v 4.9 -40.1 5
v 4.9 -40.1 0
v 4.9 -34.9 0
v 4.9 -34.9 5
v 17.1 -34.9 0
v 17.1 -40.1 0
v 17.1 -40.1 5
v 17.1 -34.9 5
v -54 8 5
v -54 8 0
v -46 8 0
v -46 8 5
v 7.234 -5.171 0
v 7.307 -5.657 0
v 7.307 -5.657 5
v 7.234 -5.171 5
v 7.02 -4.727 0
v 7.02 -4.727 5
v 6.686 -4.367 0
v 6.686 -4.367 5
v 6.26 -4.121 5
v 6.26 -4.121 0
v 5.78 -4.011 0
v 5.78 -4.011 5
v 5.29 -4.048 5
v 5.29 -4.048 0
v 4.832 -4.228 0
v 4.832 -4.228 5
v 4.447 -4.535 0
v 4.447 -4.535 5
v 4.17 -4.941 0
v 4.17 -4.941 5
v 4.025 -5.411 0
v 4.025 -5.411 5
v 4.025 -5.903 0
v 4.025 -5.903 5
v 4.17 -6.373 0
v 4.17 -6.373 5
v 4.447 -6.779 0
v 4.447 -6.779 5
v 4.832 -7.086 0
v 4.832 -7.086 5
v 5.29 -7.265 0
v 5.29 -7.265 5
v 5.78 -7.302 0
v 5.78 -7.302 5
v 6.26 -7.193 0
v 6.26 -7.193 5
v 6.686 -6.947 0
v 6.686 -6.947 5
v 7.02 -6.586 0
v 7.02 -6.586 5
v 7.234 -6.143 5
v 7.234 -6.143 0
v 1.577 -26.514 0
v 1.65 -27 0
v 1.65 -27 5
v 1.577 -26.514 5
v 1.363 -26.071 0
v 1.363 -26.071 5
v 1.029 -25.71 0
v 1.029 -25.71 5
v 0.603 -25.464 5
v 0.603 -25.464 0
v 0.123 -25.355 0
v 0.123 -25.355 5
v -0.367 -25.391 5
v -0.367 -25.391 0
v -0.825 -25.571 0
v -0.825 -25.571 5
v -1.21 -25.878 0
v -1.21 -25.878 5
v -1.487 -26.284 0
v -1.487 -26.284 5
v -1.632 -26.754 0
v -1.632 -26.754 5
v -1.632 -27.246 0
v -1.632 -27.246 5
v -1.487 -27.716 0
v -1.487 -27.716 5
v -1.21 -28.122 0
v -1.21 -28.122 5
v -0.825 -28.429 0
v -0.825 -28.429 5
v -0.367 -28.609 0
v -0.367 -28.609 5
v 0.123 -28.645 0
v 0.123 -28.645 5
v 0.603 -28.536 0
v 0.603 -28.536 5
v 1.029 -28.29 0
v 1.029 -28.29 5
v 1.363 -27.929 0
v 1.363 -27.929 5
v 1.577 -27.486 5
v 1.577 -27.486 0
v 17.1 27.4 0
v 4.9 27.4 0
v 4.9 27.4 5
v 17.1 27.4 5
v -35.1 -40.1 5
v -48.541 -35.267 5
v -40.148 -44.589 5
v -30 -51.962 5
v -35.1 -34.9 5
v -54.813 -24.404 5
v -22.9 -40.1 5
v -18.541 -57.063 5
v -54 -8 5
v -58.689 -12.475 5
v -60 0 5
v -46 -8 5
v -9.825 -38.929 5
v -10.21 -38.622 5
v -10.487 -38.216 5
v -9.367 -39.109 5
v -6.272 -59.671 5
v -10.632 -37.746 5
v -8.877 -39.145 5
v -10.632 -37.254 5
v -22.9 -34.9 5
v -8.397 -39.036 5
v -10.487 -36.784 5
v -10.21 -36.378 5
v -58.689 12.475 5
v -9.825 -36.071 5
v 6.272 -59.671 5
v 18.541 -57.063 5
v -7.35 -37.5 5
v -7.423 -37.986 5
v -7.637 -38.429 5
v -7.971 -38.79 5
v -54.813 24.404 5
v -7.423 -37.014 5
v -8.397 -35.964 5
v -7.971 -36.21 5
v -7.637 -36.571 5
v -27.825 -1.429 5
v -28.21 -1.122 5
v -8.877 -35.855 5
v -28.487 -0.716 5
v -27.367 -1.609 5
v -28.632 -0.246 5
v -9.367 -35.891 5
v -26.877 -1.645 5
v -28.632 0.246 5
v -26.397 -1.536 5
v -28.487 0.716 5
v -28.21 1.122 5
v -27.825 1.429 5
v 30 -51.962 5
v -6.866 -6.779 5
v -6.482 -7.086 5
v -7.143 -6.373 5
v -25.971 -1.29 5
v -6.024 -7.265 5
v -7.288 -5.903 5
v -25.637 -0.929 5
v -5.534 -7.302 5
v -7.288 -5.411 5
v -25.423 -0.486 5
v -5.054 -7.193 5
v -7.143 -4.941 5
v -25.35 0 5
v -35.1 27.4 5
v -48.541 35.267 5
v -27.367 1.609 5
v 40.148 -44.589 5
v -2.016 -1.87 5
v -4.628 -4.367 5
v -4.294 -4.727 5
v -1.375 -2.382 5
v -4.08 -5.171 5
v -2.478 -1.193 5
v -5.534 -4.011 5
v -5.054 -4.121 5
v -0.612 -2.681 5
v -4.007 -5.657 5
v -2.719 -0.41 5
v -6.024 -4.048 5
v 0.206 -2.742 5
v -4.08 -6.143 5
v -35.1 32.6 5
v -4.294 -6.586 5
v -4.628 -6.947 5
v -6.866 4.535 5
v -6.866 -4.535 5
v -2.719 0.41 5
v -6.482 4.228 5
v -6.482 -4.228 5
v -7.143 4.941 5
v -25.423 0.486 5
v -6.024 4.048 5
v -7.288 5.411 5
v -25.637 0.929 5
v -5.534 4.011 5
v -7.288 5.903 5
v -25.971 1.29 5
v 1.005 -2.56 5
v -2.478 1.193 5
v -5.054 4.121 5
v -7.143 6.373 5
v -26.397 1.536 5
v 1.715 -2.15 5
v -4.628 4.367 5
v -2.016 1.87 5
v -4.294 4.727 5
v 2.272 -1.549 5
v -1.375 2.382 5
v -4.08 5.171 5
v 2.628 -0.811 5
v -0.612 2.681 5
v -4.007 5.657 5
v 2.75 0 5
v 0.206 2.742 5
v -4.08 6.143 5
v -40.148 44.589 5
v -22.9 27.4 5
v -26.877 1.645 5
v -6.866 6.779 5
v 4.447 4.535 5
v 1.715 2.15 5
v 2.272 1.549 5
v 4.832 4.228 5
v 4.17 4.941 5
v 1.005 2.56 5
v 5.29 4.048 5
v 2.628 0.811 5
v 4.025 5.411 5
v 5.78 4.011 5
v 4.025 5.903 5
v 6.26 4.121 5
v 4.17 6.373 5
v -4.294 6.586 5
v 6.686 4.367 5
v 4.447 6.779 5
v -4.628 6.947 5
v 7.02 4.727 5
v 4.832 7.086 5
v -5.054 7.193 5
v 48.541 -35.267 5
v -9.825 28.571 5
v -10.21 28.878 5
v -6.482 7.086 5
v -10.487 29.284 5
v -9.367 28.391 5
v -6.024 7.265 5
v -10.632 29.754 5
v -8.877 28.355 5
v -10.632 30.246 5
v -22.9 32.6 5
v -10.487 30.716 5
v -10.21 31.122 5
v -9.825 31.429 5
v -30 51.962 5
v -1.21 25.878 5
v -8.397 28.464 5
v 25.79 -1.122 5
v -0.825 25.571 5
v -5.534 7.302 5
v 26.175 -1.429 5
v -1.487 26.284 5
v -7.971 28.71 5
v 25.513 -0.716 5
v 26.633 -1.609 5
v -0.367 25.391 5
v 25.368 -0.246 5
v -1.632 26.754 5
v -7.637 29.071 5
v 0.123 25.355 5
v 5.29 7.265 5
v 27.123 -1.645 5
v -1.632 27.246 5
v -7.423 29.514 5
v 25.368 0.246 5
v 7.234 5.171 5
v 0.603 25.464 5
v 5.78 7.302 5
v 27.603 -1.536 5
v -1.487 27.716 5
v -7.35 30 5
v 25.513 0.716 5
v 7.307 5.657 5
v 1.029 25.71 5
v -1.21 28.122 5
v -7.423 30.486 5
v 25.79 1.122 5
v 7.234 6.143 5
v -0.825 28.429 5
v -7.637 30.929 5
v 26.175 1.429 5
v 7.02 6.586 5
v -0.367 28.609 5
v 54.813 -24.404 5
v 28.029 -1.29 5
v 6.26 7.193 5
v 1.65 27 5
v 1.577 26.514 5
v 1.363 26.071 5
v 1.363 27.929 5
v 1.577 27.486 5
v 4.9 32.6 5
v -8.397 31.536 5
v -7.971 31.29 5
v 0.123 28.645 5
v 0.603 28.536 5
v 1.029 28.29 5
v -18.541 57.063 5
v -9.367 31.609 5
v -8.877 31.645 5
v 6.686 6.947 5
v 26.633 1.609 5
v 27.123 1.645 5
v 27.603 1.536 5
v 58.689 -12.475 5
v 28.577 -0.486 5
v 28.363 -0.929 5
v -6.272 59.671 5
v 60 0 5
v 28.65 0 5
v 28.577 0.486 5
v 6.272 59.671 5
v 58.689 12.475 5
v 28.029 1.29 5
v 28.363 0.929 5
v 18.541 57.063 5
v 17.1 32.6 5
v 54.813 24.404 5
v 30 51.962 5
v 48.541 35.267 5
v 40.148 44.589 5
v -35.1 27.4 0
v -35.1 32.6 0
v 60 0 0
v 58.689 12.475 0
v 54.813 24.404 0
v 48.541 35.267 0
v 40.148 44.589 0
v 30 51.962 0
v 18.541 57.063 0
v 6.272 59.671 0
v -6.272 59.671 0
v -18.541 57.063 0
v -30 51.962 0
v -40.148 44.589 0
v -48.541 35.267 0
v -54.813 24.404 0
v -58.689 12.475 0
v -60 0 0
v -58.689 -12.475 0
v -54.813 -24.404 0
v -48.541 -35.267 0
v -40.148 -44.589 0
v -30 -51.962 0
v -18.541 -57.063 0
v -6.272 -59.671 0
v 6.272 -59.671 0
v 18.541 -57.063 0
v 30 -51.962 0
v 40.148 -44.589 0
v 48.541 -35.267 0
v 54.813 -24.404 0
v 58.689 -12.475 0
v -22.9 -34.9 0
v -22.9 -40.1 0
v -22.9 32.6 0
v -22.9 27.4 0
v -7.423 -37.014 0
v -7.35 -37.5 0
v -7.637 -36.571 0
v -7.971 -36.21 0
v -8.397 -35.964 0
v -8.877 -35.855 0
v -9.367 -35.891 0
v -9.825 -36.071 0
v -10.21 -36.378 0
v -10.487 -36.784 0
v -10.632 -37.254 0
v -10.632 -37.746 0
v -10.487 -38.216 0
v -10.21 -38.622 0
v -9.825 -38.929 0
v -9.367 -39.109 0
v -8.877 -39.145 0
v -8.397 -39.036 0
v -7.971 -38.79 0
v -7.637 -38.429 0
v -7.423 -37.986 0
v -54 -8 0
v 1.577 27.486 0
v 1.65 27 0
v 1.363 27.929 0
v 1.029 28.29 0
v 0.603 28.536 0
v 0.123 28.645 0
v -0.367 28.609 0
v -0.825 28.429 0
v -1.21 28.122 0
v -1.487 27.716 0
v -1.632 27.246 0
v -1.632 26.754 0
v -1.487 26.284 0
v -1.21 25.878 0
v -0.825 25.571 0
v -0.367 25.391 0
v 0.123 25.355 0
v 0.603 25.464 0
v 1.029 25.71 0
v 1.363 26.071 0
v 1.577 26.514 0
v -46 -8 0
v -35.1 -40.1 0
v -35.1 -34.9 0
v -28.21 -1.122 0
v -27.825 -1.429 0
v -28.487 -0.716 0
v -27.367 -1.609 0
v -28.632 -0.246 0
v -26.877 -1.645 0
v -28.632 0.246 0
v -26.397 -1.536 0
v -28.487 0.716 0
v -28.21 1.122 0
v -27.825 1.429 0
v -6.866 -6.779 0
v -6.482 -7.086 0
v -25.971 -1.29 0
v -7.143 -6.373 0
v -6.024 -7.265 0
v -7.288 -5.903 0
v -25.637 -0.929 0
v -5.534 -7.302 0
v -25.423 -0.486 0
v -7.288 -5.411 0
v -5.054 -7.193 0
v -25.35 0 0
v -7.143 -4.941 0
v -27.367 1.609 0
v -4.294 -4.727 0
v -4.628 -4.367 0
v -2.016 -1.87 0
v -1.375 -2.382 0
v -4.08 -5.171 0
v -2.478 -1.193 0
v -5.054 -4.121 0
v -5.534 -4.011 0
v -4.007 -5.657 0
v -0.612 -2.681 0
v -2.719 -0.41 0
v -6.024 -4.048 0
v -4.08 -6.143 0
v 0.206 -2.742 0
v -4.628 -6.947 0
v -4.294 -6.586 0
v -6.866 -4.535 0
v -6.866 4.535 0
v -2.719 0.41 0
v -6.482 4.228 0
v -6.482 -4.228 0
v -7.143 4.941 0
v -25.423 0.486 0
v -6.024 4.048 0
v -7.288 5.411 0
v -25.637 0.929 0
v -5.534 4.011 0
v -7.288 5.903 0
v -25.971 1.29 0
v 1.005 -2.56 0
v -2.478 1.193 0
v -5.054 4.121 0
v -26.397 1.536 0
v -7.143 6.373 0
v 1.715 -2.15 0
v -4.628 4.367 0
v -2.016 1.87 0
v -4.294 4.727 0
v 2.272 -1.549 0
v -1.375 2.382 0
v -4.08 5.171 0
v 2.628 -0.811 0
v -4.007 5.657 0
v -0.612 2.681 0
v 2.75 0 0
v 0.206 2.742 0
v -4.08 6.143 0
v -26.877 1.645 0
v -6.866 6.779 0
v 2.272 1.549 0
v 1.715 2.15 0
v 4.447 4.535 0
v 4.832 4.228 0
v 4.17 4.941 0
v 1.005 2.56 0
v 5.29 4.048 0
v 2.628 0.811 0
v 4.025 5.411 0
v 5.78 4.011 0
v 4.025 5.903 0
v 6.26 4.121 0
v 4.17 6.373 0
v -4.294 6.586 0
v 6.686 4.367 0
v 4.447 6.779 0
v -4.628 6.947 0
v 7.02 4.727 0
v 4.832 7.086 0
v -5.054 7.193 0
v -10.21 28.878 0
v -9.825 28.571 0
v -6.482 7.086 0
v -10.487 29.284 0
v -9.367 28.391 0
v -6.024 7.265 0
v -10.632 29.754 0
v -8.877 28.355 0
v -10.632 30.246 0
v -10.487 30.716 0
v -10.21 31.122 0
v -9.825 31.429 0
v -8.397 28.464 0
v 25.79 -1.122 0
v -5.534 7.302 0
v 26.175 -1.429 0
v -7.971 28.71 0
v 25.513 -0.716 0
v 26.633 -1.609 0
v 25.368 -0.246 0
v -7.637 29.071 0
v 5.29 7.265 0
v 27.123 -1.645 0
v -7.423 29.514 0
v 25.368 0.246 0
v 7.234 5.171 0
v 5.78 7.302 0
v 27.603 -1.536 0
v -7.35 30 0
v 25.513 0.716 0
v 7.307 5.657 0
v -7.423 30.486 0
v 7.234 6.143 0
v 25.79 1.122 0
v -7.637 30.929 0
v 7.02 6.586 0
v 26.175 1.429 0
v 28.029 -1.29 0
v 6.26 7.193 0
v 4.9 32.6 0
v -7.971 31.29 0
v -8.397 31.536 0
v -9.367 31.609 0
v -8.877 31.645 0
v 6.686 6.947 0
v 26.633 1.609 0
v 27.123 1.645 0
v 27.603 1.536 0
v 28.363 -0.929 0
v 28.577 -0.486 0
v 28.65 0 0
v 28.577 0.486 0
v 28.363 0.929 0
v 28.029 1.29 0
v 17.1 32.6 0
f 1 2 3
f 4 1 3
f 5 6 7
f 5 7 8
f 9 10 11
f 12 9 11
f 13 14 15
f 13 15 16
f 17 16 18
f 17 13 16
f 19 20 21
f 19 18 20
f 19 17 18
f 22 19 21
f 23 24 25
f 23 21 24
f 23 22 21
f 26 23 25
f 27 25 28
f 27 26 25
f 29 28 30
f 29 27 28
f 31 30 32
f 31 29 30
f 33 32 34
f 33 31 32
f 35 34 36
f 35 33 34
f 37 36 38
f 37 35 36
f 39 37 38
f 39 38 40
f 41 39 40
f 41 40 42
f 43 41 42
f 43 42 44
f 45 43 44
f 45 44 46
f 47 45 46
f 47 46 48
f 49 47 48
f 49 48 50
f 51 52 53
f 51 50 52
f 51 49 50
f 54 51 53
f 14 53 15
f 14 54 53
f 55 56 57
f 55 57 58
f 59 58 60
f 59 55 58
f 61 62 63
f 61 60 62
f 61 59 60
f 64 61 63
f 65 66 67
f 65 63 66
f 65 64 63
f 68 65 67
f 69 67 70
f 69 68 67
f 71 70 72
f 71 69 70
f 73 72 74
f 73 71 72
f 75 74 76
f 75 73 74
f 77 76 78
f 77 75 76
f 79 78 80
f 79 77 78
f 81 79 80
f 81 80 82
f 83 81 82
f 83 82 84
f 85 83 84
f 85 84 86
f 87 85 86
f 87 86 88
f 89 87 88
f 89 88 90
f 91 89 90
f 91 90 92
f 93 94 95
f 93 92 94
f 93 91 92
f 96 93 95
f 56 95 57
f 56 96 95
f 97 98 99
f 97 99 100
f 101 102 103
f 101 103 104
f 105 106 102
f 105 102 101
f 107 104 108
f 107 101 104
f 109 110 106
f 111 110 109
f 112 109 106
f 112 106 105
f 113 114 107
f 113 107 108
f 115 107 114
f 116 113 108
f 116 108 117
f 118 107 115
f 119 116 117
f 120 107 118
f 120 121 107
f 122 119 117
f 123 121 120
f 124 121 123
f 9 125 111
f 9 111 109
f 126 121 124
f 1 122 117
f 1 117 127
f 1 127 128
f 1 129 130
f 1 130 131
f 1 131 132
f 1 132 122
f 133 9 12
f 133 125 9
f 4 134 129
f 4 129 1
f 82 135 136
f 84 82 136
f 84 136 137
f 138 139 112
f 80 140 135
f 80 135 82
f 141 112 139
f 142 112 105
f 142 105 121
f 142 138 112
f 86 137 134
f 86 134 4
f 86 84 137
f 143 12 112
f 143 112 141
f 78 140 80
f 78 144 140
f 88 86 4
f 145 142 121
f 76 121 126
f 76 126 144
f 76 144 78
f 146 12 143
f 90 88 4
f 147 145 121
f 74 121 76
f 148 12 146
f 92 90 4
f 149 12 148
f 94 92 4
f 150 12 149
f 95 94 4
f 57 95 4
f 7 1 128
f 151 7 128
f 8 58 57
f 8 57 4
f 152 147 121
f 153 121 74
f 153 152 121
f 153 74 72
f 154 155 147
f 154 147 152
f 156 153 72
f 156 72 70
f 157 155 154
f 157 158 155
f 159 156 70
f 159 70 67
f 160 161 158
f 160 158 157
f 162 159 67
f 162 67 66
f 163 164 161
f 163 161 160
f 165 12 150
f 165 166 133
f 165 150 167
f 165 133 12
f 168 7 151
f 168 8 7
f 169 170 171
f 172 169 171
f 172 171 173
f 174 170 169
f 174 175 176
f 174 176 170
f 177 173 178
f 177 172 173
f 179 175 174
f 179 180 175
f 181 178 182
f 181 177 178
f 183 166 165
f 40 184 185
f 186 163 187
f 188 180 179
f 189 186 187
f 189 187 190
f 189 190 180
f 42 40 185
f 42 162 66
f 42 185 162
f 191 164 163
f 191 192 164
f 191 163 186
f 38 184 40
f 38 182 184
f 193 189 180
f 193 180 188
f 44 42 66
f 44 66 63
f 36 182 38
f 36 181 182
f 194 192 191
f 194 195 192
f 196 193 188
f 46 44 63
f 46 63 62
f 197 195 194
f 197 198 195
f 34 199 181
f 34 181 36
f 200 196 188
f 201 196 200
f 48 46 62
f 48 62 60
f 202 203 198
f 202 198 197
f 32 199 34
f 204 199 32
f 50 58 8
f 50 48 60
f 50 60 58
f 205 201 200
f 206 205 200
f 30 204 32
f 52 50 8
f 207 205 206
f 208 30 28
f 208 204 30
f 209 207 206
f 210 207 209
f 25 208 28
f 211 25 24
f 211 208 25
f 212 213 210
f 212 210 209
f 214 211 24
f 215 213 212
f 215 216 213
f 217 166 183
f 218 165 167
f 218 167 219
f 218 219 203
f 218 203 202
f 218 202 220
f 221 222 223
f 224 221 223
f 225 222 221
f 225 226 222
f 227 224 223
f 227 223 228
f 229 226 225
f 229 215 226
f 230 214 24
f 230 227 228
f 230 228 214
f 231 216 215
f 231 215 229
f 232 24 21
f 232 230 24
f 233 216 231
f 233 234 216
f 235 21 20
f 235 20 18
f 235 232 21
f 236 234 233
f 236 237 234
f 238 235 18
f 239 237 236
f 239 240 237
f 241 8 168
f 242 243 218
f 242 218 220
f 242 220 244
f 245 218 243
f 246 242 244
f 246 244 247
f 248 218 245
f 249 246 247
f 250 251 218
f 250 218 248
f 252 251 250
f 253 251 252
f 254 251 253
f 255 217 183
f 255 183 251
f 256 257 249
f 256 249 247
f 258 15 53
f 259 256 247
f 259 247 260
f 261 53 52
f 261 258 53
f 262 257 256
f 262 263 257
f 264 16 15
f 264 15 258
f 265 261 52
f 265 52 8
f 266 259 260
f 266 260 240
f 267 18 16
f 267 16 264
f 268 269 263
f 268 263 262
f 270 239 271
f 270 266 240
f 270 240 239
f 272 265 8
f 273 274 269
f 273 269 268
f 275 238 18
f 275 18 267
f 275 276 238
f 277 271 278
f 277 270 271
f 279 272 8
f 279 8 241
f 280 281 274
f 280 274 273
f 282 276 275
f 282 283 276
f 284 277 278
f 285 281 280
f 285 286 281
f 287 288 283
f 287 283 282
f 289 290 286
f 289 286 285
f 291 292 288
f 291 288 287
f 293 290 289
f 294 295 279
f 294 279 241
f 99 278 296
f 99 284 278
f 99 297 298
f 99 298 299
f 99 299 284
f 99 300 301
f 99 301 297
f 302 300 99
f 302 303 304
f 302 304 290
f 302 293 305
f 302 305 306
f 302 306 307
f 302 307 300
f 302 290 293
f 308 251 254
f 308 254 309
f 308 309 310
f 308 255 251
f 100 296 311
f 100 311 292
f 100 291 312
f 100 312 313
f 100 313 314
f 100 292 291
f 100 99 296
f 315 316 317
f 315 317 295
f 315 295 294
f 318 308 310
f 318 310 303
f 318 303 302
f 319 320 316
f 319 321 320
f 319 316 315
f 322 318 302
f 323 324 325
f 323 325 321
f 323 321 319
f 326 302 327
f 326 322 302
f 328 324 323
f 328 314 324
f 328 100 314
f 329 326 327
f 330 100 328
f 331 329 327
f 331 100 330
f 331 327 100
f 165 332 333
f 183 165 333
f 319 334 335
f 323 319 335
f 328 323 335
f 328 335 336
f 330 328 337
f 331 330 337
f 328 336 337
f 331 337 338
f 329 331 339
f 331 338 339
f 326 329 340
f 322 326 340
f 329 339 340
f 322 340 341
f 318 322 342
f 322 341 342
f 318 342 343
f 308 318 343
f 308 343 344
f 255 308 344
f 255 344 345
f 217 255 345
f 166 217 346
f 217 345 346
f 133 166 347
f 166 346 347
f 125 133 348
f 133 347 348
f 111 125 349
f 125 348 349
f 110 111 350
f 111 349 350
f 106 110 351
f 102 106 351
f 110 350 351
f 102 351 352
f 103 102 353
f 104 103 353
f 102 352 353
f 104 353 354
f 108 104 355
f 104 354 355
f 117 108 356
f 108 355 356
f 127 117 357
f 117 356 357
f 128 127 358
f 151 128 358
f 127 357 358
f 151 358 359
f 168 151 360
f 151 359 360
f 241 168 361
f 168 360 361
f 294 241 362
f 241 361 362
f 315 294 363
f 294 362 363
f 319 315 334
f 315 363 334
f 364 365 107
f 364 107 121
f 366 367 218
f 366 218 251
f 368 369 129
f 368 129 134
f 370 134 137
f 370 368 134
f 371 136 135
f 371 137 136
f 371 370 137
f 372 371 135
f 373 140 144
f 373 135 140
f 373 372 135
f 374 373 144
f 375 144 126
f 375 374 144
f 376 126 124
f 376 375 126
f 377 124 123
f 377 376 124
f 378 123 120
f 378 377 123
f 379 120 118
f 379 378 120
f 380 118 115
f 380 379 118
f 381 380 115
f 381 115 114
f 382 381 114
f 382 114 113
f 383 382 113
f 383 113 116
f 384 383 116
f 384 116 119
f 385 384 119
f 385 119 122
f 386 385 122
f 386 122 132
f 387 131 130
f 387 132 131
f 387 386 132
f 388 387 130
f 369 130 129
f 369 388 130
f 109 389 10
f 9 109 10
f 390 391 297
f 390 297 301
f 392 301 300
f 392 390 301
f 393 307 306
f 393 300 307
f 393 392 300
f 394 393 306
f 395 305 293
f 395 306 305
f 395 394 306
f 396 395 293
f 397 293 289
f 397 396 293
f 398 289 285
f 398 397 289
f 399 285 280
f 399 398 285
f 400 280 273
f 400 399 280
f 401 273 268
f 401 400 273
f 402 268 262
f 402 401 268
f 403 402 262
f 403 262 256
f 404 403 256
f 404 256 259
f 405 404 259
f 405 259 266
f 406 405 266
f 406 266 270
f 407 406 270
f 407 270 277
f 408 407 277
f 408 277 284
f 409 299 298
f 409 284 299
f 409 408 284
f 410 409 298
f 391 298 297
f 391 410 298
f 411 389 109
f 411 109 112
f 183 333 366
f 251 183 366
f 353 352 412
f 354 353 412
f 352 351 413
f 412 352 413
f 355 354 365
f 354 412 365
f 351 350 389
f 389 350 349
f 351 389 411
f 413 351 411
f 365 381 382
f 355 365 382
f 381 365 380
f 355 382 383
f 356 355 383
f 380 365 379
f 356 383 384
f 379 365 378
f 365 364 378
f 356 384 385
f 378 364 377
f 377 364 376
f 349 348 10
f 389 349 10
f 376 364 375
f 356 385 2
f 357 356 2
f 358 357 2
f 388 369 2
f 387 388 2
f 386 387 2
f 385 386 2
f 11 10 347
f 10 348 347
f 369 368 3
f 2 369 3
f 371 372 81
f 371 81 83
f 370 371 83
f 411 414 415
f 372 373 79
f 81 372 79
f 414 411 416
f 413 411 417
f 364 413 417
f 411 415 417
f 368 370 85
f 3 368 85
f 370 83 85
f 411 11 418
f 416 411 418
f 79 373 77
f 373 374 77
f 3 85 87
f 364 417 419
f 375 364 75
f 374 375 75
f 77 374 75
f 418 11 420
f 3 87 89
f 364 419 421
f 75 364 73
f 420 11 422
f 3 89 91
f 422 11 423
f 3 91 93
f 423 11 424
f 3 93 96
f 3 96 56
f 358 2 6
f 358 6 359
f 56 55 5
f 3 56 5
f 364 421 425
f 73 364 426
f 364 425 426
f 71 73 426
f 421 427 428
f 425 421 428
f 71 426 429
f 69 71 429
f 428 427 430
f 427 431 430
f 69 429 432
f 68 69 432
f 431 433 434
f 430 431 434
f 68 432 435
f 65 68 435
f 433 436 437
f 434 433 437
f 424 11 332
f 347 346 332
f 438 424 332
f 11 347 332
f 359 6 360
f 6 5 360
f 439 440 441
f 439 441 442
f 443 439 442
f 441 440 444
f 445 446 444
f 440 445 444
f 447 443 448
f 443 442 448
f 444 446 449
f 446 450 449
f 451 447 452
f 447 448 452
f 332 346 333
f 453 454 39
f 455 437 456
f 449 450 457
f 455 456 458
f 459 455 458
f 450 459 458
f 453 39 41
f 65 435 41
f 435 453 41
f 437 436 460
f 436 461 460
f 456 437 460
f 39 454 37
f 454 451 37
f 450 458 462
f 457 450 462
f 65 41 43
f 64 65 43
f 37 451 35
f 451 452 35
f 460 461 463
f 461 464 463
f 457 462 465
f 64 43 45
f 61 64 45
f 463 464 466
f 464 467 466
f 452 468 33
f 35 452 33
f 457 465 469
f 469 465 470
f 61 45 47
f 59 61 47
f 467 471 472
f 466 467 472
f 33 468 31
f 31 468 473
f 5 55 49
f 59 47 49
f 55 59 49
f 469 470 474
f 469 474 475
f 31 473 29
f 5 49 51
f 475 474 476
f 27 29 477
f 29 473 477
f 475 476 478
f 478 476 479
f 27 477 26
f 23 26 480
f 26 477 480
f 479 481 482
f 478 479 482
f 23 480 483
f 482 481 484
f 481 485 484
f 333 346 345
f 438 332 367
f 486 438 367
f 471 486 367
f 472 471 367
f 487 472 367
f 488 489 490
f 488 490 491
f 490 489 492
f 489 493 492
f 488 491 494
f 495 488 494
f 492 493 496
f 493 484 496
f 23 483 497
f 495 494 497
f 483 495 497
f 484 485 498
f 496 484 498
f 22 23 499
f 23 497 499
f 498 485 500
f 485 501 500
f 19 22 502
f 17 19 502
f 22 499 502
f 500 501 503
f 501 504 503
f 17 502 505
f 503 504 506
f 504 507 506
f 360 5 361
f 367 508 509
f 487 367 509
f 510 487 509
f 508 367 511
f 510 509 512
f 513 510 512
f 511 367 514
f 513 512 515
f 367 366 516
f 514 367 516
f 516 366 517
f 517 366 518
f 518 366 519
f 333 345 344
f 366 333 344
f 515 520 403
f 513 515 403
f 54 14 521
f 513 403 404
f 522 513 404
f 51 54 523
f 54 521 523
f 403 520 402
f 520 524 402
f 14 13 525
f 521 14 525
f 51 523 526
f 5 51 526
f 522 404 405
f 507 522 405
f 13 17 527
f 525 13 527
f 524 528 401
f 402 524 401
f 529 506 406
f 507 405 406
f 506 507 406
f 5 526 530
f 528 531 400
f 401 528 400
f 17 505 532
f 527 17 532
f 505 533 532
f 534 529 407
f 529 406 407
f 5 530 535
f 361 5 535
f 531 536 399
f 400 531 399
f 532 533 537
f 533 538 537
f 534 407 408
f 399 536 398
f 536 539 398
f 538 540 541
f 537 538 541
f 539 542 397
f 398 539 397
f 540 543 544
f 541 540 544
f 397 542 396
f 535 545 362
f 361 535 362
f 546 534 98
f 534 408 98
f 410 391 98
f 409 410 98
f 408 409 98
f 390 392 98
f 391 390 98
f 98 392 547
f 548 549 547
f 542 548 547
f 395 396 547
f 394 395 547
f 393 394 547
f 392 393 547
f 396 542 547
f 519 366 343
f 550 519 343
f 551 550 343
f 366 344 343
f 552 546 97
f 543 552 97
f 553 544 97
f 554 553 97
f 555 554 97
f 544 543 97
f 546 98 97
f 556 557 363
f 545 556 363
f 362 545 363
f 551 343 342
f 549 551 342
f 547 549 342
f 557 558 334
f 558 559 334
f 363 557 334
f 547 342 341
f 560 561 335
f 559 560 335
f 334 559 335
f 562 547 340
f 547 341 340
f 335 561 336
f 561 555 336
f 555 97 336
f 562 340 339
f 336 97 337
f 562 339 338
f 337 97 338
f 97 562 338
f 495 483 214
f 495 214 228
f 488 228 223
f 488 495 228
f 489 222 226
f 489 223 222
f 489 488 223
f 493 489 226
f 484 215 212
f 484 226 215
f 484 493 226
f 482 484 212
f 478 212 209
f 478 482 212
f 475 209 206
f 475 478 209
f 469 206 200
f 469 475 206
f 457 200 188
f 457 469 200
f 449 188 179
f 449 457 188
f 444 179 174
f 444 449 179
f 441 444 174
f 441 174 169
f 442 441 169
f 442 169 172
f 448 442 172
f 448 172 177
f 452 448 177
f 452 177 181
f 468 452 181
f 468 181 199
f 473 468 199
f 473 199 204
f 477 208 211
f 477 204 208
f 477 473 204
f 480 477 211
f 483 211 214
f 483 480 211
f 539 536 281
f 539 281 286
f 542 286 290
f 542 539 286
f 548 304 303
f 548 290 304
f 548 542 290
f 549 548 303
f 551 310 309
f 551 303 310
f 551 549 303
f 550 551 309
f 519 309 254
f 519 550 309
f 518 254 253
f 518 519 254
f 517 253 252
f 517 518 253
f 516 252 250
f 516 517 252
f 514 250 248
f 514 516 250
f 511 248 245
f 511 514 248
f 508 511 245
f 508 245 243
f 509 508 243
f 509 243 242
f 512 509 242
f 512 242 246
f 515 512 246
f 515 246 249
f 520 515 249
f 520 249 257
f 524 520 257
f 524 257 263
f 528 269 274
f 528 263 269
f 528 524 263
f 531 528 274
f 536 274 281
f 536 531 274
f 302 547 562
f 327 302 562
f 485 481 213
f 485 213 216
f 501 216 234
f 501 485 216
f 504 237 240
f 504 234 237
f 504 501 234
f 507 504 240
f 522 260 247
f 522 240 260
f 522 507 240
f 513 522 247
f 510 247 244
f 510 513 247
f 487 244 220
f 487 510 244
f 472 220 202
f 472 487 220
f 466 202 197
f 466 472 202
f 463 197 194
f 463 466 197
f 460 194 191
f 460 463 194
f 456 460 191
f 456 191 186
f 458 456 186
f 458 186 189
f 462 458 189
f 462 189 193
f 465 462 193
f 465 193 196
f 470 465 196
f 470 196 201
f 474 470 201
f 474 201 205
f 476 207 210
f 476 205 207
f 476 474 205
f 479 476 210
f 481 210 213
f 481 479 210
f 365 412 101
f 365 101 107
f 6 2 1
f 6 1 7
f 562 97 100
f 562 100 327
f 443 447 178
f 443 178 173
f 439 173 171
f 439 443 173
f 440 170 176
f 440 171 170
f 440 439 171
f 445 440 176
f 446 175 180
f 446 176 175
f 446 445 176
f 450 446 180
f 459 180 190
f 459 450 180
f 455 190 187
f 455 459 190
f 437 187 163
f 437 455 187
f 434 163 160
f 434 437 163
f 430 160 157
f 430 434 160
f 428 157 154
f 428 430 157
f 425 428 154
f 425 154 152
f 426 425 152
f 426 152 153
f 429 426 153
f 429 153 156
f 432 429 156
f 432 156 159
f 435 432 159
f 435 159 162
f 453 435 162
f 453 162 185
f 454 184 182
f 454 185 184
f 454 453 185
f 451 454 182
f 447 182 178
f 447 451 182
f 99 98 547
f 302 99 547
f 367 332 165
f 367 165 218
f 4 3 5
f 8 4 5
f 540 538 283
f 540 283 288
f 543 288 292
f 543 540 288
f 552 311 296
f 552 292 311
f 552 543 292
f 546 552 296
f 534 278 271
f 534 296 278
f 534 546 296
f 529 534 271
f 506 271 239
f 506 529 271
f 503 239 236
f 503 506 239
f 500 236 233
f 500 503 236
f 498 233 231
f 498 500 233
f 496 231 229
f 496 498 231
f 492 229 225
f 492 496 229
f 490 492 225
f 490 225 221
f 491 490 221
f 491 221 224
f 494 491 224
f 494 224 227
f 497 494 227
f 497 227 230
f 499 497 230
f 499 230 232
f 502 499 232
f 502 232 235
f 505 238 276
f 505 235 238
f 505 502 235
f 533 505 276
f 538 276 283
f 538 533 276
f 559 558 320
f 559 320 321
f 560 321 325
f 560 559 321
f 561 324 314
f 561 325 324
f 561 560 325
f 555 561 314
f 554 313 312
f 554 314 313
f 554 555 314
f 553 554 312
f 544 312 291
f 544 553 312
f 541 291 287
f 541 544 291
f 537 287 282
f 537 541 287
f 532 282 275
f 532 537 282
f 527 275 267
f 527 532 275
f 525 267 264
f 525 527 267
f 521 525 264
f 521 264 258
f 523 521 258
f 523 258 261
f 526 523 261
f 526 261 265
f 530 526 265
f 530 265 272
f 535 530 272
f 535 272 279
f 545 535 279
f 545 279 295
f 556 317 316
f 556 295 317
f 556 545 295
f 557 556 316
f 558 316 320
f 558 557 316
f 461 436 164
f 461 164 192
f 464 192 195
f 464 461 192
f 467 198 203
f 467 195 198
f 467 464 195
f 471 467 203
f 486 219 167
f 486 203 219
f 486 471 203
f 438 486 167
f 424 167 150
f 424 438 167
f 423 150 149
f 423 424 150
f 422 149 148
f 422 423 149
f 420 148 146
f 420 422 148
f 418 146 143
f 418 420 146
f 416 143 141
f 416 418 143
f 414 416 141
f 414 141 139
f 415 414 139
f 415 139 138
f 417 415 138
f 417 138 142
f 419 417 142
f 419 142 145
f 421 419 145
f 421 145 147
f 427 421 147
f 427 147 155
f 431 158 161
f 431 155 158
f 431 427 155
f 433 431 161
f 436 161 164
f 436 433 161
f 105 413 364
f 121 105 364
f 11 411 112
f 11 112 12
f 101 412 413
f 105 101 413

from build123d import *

# Parameters (mm, degrees)
ESKIZ_KONTUR_R        = 60
ESKIZ_KONTUR_W        = 12.2
ESKIZ_KONTUR_H        = 5.2
ESKIZ_KONTUR_W_2      = 8
ESKIZ_KONTUR_H_2      = 16
PLASTINA_DEPTH        = 5
OTVERSTIYA_DEPTH      = 86
OTVERSTIYA_DEPTH_BACK = 86
ESKIZ_OTVERSTIYA_R    = 1.65
ESKIZ_OTVERSTIYA_R_2  = 2.75


with BuildPart() as part:
    # Eskiz_kontur → Plastina (new body)
    with BuildSketch(Plane.XY):
        Circle(ESKIZ_KONTUR_R)
        with Locations((-29, -37.5)):
            Rectangle(ESKIZ_KONTUR_W, ESKIZ_KONTUR_H, mode=Mode.SUBTRACT)
        with Locations((11, -37.5)):
            Rectangle(ESKIZ_KONTUR_W, ESKIZ_KONTUR_H, mode=Mode.SUBTRACT)
        with Locations((-50, 0)):
            Rectangle(ESKIZ_KONTUR_W_2, ESKIZ_KONTUR_H_2, mode=Mode.SUBTRACT)
        with Locations((-29, 30)):
            Rectangle(ESKIZ_KONTUR_W, ESKIZ_KONTUR_H, mode=Mode.SUBTRACT)
        with Locations((11, 30)):
            Rectangle(ESKIZ_KONTUR_W, ESKIZ_KONTUR_H, mode=Mode.SUBTRACT)
    extrude(amount=PLASTINA_DEPTH)

    # Eskiz_otverstiya → Otverstiya (cut, two sides: drawn at the far end of the back side and taken through both)
    with BuildSketch(Plane.XY.offset(-OTVERSTIYA_DEPTH_BACK)):
        with Locations((-9, -37.5)):
            Circle(ESKIZ_OTVERSTIYA_R)
        with Locations((0, -27)):
            Circle(ESKIZ_OTVERSTIYA_R)
        with Locations((-5.65685, -5.65685)):
            Circle(ESKIZ_OTVERSTIYA_R)
        with Locations((5.65685, -5.65685)):
            Circle(ESKIZ_OTVERSTIYA_R)
        with Locations((-27, 0)):
            Circle(ESKIZ_OTVERSTIYA_R)
        Circle(ESKIZ_OTVERSTIYA_R_2)
        with Locations((-5.65685, 5.65685)):
            Circle(ESKIZ_OTVERSTIYA_R)
        with Locations((5.65685, 5.65685)):
            Circle(ESKIZ_OTVERSTIYA_R)
        with Locations((27, 0)):
            Circle(ESKIZ_OTVERSTIYA_R)
        with Locations((-9, 30)):
            Circle(ESKIZ_OTVERSTIYA_R)
        with Locations((0, 27)):
            Circle(ESKIZ_OTVERSTIYA_R)
    extrude(amount=OTVERSTIYA_DEPTH + OTVERSTIYA_DEPTH_BACK, mode=Mode.SUBTRACT)


solid = part.part
